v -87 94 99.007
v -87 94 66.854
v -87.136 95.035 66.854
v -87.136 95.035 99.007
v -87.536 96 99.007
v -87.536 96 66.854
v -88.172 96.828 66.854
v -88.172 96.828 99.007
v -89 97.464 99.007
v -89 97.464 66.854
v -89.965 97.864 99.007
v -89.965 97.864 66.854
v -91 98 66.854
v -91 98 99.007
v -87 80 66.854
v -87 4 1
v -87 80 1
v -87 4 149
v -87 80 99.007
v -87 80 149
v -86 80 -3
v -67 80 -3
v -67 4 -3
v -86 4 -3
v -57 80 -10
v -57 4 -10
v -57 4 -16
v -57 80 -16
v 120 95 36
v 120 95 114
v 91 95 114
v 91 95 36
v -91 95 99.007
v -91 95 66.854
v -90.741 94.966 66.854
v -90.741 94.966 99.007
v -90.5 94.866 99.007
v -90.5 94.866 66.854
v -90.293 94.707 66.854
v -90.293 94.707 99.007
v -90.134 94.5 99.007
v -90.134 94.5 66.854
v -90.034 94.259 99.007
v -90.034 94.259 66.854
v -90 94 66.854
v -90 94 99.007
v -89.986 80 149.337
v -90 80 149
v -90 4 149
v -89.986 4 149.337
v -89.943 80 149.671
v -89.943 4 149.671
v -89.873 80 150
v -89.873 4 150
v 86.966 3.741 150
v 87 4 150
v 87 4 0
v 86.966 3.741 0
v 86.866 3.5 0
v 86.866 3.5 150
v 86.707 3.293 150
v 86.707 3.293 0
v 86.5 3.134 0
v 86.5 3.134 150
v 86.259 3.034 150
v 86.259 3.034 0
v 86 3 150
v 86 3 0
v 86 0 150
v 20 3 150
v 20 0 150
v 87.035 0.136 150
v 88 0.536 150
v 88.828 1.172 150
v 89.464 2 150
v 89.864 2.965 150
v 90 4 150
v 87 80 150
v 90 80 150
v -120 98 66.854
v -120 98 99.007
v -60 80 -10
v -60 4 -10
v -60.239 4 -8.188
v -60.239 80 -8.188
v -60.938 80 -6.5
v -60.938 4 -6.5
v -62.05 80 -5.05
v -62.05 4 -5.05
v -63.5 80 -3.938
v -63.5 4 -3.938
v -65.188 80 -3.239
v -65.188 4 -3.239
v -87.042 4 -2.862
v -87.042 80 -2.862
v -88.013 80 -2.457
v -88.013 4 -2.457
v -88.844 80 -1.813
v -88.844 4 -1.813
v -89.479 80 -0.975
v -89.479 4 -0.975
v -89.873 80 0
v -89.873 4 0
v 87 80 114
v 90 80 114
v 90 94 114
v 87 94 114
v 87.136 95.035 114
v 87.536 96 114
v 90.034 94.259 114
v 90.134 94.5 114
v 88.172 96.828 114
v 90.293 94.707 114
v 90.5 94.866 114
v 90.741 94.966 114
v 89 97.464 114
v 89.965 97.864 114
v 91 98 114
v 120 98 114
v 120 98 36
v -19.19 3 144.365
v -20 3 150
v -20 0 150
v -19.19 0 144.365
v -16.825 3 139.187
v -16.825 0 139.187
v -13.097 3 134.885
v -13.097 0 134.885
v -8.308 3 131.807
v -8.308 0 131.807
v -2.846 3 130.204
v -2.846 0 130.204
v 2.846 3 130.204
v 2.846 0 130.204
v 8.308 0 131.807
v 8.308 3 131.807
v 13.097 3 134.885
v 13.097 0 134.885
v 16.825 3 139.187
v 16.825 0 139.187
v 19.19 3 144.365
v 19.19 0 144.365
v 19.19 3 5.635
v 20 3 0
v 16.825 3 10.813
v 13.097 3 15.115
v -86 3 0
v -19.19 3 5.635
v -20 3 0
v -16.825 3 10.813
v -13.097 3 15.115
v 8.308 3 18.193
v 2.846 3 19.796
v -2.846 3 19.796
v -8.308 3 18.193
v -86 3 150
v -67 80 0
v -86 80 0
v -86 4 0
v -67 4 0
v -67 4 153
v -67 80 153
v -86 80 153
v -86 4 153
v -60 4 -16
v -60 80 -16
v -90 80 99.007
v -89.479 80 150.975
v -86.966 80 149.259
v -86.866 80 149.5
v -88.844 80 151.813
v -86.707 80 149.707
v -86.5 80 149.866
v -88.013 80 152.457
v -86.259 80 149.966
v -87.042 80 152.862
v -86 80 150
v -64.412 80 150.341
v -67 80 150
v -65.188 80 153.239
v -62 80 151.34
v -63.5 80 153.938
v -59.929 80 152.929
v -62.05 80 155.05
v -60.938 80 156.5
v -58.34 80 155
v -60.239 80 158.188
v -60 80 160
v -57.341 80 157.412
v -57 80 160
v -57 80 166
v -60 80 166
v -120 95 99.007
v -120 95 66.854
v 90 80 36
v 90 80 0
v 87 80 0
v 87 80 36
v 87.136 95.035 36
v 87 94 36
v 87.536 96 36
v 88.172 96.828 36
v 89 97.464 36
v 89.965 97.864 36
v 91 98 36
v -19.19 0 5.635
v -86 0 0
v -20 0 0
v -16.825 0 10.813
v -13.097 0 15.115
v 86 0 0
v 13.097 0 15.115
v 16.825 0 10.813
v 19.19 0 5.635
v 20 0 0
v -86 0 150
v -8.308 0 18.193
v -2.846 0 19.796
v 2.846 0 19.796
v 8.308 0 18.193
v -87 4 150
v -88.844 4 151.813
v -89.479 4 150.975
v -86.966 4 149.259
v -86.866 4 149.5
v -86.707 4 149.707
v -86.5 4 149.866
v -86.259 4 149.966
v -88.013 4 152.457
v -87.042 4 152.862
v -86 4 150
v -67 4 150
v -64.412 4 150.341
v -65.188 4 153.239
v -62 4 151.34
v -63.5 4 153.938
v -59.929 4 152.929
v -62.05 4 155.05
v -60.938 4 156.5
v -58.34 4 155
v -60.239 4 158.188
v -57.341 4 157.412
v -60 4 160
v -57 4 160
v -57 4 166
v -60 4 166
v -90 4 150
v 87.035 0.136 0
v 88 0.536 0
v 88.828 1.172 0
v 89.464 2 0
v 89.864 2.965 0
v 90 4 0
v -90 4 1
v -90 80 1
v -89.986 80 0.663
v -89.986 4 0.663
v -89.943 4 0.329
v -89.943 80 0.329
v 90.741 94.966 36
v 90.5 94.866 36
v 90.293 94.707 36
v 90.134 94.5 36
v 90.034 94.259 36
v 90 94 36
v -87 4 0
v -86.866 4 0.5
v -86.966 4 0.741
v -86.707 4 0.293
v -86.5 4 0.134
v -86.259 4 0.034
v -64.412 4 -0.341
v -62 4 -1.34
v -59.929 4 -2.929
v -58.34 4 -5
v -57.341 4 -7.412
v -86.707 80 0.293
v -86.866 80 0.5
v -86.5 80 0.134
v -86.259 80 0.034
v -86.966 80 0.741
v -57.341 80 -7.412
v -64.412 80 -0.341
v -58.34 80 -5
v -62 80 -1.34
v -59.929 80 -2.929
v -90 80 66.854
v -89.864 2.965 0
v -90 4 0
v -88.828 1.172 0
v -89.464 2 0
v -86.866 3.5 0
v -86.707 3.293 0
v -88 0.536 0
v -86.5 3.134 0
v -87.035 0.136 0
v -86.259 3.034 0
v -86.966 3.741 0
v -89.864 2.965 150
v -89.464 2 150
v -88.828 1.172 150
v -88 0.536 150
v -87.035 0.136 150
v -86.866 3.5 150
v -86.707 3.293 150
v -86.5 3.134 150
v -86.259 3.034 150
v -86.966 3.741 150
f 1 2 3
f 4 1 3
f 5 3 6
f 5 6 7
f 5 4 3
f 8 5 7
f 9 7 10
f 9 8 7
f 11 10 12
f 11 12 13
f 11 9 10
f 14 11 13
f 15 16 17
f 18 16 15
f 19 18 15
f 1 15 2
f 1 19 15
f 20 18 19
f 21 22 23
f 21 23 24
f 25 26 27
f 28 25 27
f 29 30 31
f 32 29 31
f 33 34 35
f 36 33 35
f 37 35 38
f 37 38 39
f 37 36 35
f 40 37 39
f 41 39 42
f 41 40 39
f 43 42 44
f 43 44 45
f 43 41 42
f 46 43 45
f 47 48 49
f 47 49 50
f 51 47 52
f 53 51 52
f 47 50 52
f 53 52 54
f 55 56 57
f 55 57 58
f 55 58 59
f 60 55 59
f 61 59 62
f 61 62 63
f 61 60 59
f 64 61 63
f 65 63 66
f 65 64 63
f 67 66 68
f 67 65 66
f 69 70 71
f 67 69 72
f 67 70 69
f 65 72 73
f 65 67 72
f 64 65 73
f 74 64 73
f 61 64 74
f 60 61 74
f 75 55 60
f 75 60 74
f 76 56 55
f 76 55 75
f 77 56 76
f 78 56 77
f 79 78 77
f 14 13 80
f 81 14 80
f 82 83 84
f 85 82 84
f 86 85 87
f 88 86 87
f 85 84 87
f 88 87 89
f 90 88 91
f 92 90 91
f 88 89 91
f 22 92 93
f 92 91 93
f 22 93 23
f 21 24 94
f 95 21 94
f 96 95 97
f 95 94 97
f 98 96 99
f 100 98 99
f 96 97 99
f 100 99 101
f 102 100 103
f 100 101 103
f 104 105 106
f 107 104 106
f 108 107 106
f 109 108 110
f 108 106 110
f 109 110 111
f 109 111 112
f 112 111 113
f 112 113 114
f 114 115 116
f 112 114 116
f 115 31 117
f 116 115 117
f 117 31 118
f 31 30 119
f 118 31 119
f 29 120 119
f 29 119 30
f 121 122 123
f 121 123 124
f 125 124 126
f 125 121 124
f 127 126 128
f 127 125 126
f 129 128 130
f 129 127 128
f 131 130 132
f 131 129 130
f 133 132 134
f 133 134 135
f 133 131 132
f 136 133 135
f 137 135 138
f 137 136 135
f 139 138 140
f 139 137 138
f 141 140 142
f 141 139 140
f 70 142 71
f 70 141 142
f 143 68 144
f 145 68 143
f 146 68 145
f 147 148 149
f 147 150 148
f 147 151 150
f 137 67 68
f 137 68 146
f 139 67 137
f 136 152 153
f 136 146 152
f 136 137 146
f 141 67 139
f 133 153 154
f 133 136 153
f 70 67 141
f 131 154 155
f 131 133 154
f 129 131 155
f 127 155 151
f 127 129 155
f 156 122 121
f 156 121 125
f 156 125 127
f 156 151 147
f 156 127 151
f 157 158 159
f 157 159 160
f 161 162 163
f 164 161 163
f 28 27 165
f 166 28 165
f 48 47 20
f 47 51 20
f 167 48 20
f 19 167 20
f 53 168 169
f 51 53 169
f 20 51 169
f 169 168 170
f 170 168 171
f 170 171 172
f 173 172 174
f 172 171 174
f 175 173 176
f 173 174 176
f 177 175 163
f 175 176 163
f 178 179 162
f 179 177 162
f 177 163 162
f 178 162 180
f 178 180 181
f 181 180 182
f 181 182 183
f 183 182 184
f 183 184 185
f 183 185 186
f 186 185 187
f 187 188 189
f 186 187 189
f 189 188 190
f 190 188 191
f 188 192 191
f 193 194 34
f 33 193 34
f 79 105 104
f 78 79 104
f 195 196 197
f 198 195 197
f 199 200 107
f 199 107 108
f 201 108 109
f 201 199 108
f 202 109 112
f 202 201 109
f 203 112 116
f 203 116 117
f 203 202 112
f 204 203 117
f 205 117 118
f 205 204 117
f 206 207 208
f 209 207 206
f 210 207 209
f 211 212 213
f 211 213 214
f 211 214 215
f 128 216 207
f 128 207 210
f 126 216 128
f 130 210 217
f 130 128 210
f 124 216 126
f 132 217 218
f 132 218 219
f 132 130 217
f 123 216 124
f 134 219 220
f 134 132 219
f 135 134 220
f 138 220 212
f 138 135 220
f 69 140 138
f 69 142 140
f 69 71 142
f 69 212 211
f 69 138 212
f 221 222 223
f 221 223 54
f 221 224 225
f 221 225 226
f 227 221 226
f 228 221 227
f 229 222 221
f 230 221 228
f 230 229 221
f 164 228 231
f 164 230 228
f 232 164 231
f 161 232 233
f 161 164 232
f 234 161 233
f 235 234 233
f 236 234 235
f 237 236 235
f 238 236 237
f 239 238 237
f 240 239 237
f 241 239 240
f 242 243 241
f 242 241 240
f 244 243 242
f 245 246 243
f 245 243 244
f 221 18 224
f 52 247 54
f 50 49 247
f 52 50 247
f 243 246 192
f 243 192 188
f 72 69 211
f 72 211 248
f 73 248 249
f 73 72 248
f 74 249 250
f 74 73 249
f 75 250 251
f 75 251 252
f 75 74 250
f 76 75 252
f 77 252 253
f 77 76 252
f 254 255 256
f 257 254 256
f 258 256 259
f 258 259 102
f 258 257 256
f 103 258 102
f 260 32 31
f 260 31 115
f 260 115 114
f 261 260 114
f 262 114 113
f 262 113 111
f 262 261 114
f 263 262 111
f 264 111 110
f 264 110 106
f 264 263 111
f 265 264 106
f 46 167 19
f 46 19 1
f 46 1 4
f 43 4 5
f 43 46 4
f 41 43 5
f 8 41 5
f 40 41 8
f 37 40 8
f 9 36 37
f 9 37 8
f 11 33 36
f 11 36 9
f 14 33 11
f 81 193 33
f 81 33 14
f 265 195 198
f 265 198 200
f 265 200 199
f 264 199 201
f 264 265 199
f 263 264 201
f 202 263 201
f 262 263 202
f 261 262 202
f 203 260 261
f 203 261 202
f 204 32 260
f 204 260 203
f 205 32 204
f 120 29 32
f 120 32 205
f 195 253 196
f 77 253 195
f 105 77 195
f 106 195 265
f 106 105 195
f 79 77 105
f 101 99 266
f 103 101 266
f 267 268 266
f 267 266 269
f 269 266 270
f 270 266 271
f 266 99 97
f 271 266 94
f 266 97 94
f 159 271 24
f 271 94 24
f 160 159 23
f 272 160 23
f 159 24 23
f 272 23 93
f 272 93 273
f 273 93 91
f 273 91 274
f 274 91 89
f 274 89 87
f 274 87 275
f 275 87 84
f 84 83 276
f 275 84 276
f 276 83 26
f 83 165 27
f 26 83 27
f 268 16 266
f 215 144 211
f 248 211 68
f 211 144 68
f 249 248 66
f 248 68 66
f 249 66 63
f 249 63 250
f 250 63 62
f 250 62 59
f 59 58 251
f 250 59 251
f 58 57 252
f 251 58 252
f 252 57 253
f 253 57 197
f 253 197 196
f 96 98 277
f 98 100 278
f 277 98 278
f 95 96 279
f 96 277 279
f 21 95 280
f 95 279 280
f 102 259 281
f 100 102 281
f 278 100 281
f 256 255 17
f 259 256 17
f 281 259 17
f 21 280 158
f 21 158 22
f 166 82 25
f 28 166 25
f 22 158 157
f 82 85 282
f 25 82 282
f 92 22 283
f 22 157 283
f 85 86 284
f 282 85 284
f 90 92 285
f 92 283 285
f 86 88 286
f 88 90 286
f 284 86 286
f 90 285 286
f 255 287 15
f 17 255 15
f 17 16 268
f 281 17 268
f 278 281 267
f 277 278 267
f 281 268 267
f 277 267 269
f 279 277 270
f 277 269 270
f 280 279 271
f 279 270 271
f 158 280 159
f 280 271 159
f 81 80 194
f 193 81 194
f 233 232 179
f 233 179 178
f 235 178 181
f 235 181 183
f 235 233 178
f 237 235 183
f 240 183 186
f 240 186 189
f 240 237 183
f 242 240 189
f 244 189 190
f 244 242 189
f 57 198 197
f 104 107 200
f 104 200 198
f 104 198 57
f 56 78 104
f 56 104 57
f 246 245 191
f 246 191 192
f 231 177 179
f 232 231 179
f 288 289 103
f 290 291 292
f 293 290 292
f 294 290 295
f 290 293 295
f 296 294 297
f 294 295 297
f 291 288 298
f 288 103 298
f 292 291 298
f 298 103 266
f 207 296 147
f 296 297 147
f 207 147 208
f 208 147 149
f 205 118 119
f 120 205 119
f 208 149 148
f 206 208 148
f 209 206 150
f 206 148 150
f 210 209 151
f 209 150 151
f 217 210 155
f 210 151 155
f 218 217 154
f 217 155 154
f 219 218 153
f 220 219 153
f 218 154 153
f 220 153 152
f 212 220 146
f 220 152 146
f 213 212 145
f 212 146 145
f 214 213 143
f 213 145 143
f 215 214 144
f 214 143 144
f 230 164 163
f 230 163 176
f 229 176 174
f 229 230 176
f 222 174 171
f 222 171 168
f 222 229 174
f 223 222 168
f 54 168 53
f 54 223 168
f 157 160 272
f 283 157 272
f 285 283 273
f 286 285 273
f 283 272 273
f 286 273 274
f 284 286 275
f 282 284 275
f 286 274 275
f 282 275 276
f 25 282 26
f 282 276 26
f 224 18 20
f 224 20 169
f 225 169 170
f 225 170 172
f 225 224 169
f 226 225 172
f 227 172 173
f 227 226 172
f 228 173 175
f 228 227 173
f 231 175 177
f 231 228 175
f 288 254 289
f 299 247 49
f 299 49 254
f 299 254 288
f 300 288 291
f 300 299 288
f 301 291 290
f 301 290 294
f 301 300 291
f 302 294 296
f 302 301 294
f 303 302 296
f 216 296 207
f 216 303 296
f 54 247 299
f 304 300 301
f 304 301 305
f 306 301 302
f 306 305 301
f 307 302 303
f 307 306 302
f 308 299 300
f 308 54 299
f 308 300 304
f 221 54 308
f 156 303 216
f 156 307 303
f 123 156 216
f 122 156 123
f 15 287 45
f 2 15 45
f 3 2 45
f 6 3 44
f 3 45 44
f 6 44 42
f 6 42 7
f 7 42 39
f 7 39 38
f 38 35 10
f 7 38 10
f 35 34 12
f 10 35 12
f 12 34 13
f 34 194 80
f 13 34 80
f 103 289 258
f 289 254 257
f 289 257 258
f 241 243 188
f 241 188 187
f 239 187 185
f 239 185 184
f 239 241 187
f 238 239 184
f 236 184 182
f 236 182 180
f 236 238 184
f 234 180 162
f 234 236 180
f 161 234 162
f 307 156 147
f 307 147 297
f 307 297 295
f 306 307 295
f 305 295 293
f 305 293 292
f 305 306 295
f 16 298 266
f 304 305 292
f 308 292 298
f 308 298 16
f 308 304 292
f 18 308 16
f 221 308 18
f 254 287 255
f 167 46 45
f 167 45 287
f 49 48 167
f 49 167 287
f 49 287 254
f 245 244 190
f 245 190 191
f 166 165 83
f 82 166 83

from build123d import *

# Parameters (mm, degrees)
BASE_FLANGE1_DEPTH      = 75
SKETCH4_R               = 20
CUT_EXTRUDE1_DEPTH      = 3
MITER_START             = 4
MITER_FLANGE1_DEPTH     = 76
MITER_FLANGE1_2_DEPTH   = 76
EDGE_FLANGE1_DEPTH      = 78
EDGE_FLANGE1_BEND_DEPTH = 32.152557442


# Read off the part's stored shape, not the designer's step: Miter Flange1
# Sheet-metal steps are written as plain solids
with BuildPart() as part:
    # Sketch1 → Base-Flange1 (new body)
    with BuildSketch(Plane.XY):
        with BuildLine():
            Line((-90, 80), (-90, 4))
            ThreePointArc((-90, 4), (-88.828427125, 1.171572875), (-86, 0))
            Line((-86, 0), (86, 0))
            ThreePointArc((86, 0), (88.828427125, 1.171572875), (90, 4))
            Line((90, 4), (90, 80))
            Line((90, 80), (87, 80))
            Line((87, 80), (87, 4))
            ThreePointArc((87, 4), (86.707106781, 3.292893219), (86, 3))
            Line((86, 3), (-86, 3))
            ThreePointArc((-86, 3), (-86.707106781, 3.292893219), (-87, 4))
            Line((-87, 4), (-87, 80))
            Line((-87, 80), (-90, 80))
        make_face()
    extrude(amount=BASE_FLANGE1_DEPTH)

    # Sketch4 → Cut-Extrude1 (cut)
    with BuildSketch(Plane(origin=(0, 3, 0), x_dir=(1, 0, 0), z_dir=(0, 1, 0))):
        Circle(SKETCH4_R)
    extrude(amount=-CUT_EXTRUDE1_DEPTH, mode=Mode.SUBTRACT)

    # Miter Flange1 outline → Miter Flange1 (cut)
    with BuildSketch(Plane(origin=(0, 0, 0), x_dir=(1, 0, 0), z_dir=(0, 1, 0)).offset(MITER_START)):
        with BuildLine():
            ThreePointArc((-90, -1), (-89.968118785, -0.49598283), (-89.872983346, 0))
            Line((-89.872983346, 0), (-90, 0))
            Line((-90, 0), (-90, -1))
        make_face()
    extrude(amount=MITER_FLANGE1_DEPTH, mode=Mode.SUBTRACT)

    # Miter Flange1 2 outline → Miter Flange1 2 (add)
    with BuildSketch(Plane(origin=(0, 0, 0), x_dir=(1, 0, 0), z_dir=(0, 1, 0)).offset(MITER_START)):
        with BuildLine():
            Line((-57, 10), (-57, 16))
            Line((-57, 16), (-60, 16))
            Line((-60, 16), (-60, 10))
            ThreePointArc((-60, 10), (-62.050252532, 5.050252532), (-67, 3))
            Line((-67, 3), (-86, 3))
            ThreePointArc((-86, 3), (-88.449489743, 2.16227766), (-89.872983346, 0))
            Line((-89.872983346, 0), (-87, 0))
            Line((-87, 0), (-87, -1))
            ThreePointArc((-87, -1), (-86.707106781, -0.292893219), (-86, 0))
            Line((-86, 0), (-67, 0))
            ThreePointArc((-67, 0), (-59.928932188, 2.928932188), (-57, 10))
        make_face()
    extrude(amount=MITER_FLANGE1_2_DEPTH)

    # Mirror1: part across plane


with BuildPart() as part_1:
    add(part.part)
    add(part.part.mirror(Plane(origin=(87, 4, 75), x_dir=(1, 0, 0), z_dir=(0, 0, 1))))

    # Edge-Flange1 section (across the edge) → Edge-Flange1 (add)
    with BuildSketch(Plane(origin=(90, 95, 36), x_dir=(0, -1, 0), z_dir=(0, 0, 1))):
        with BuildLine():
            Line((-3, 1), (-3, 30))
            Line((-3, 30), (0, 30))
            Line((0, 30), (0, 1))
            ThreePointArc((0, 1), (0.292893219, 0.292893219), (1, 0))
            Line((1, 0), (15, 0))
            Line((15, 0), (15, -3))
            Line((15, -3), (1, -3))
            ThreePointArc((1, -3), (-1.828427125, -1.828427125), (-3, 1))
        make_face()
    extrude(amount=EDGE_FLANGE1_DEPTH)

    # Edge-Flange1 section 2 (across the edge) → Edge-Flange1 bend (add)
    with BuildSketch(Plane(origin=(-90, 95, 99.006927285), x_dir=(0, -1, 0), z_dir=(0, 0, -1))):
        with BuildLine():
            Line((-3, 1), (-3, 30))
            Line((-3, 30), (0, 30))
            Line((0, 30), (0, 1))
            ThreePointArc((0, 1), (0.292893219, 0.292893219), (1, 0))
            Line((1, 0), (15, 0))
            Line((15, 0), (15, -3))
            Line((15, -3), (1, -3))
            ThreePointArc((1, -3), (-1.828427125, -1.828427125), (-3, 1))
        make_face()
    extrude(amount=EDGE_FLANGE1_BEND_DEPTH)


solid = part_1.part
